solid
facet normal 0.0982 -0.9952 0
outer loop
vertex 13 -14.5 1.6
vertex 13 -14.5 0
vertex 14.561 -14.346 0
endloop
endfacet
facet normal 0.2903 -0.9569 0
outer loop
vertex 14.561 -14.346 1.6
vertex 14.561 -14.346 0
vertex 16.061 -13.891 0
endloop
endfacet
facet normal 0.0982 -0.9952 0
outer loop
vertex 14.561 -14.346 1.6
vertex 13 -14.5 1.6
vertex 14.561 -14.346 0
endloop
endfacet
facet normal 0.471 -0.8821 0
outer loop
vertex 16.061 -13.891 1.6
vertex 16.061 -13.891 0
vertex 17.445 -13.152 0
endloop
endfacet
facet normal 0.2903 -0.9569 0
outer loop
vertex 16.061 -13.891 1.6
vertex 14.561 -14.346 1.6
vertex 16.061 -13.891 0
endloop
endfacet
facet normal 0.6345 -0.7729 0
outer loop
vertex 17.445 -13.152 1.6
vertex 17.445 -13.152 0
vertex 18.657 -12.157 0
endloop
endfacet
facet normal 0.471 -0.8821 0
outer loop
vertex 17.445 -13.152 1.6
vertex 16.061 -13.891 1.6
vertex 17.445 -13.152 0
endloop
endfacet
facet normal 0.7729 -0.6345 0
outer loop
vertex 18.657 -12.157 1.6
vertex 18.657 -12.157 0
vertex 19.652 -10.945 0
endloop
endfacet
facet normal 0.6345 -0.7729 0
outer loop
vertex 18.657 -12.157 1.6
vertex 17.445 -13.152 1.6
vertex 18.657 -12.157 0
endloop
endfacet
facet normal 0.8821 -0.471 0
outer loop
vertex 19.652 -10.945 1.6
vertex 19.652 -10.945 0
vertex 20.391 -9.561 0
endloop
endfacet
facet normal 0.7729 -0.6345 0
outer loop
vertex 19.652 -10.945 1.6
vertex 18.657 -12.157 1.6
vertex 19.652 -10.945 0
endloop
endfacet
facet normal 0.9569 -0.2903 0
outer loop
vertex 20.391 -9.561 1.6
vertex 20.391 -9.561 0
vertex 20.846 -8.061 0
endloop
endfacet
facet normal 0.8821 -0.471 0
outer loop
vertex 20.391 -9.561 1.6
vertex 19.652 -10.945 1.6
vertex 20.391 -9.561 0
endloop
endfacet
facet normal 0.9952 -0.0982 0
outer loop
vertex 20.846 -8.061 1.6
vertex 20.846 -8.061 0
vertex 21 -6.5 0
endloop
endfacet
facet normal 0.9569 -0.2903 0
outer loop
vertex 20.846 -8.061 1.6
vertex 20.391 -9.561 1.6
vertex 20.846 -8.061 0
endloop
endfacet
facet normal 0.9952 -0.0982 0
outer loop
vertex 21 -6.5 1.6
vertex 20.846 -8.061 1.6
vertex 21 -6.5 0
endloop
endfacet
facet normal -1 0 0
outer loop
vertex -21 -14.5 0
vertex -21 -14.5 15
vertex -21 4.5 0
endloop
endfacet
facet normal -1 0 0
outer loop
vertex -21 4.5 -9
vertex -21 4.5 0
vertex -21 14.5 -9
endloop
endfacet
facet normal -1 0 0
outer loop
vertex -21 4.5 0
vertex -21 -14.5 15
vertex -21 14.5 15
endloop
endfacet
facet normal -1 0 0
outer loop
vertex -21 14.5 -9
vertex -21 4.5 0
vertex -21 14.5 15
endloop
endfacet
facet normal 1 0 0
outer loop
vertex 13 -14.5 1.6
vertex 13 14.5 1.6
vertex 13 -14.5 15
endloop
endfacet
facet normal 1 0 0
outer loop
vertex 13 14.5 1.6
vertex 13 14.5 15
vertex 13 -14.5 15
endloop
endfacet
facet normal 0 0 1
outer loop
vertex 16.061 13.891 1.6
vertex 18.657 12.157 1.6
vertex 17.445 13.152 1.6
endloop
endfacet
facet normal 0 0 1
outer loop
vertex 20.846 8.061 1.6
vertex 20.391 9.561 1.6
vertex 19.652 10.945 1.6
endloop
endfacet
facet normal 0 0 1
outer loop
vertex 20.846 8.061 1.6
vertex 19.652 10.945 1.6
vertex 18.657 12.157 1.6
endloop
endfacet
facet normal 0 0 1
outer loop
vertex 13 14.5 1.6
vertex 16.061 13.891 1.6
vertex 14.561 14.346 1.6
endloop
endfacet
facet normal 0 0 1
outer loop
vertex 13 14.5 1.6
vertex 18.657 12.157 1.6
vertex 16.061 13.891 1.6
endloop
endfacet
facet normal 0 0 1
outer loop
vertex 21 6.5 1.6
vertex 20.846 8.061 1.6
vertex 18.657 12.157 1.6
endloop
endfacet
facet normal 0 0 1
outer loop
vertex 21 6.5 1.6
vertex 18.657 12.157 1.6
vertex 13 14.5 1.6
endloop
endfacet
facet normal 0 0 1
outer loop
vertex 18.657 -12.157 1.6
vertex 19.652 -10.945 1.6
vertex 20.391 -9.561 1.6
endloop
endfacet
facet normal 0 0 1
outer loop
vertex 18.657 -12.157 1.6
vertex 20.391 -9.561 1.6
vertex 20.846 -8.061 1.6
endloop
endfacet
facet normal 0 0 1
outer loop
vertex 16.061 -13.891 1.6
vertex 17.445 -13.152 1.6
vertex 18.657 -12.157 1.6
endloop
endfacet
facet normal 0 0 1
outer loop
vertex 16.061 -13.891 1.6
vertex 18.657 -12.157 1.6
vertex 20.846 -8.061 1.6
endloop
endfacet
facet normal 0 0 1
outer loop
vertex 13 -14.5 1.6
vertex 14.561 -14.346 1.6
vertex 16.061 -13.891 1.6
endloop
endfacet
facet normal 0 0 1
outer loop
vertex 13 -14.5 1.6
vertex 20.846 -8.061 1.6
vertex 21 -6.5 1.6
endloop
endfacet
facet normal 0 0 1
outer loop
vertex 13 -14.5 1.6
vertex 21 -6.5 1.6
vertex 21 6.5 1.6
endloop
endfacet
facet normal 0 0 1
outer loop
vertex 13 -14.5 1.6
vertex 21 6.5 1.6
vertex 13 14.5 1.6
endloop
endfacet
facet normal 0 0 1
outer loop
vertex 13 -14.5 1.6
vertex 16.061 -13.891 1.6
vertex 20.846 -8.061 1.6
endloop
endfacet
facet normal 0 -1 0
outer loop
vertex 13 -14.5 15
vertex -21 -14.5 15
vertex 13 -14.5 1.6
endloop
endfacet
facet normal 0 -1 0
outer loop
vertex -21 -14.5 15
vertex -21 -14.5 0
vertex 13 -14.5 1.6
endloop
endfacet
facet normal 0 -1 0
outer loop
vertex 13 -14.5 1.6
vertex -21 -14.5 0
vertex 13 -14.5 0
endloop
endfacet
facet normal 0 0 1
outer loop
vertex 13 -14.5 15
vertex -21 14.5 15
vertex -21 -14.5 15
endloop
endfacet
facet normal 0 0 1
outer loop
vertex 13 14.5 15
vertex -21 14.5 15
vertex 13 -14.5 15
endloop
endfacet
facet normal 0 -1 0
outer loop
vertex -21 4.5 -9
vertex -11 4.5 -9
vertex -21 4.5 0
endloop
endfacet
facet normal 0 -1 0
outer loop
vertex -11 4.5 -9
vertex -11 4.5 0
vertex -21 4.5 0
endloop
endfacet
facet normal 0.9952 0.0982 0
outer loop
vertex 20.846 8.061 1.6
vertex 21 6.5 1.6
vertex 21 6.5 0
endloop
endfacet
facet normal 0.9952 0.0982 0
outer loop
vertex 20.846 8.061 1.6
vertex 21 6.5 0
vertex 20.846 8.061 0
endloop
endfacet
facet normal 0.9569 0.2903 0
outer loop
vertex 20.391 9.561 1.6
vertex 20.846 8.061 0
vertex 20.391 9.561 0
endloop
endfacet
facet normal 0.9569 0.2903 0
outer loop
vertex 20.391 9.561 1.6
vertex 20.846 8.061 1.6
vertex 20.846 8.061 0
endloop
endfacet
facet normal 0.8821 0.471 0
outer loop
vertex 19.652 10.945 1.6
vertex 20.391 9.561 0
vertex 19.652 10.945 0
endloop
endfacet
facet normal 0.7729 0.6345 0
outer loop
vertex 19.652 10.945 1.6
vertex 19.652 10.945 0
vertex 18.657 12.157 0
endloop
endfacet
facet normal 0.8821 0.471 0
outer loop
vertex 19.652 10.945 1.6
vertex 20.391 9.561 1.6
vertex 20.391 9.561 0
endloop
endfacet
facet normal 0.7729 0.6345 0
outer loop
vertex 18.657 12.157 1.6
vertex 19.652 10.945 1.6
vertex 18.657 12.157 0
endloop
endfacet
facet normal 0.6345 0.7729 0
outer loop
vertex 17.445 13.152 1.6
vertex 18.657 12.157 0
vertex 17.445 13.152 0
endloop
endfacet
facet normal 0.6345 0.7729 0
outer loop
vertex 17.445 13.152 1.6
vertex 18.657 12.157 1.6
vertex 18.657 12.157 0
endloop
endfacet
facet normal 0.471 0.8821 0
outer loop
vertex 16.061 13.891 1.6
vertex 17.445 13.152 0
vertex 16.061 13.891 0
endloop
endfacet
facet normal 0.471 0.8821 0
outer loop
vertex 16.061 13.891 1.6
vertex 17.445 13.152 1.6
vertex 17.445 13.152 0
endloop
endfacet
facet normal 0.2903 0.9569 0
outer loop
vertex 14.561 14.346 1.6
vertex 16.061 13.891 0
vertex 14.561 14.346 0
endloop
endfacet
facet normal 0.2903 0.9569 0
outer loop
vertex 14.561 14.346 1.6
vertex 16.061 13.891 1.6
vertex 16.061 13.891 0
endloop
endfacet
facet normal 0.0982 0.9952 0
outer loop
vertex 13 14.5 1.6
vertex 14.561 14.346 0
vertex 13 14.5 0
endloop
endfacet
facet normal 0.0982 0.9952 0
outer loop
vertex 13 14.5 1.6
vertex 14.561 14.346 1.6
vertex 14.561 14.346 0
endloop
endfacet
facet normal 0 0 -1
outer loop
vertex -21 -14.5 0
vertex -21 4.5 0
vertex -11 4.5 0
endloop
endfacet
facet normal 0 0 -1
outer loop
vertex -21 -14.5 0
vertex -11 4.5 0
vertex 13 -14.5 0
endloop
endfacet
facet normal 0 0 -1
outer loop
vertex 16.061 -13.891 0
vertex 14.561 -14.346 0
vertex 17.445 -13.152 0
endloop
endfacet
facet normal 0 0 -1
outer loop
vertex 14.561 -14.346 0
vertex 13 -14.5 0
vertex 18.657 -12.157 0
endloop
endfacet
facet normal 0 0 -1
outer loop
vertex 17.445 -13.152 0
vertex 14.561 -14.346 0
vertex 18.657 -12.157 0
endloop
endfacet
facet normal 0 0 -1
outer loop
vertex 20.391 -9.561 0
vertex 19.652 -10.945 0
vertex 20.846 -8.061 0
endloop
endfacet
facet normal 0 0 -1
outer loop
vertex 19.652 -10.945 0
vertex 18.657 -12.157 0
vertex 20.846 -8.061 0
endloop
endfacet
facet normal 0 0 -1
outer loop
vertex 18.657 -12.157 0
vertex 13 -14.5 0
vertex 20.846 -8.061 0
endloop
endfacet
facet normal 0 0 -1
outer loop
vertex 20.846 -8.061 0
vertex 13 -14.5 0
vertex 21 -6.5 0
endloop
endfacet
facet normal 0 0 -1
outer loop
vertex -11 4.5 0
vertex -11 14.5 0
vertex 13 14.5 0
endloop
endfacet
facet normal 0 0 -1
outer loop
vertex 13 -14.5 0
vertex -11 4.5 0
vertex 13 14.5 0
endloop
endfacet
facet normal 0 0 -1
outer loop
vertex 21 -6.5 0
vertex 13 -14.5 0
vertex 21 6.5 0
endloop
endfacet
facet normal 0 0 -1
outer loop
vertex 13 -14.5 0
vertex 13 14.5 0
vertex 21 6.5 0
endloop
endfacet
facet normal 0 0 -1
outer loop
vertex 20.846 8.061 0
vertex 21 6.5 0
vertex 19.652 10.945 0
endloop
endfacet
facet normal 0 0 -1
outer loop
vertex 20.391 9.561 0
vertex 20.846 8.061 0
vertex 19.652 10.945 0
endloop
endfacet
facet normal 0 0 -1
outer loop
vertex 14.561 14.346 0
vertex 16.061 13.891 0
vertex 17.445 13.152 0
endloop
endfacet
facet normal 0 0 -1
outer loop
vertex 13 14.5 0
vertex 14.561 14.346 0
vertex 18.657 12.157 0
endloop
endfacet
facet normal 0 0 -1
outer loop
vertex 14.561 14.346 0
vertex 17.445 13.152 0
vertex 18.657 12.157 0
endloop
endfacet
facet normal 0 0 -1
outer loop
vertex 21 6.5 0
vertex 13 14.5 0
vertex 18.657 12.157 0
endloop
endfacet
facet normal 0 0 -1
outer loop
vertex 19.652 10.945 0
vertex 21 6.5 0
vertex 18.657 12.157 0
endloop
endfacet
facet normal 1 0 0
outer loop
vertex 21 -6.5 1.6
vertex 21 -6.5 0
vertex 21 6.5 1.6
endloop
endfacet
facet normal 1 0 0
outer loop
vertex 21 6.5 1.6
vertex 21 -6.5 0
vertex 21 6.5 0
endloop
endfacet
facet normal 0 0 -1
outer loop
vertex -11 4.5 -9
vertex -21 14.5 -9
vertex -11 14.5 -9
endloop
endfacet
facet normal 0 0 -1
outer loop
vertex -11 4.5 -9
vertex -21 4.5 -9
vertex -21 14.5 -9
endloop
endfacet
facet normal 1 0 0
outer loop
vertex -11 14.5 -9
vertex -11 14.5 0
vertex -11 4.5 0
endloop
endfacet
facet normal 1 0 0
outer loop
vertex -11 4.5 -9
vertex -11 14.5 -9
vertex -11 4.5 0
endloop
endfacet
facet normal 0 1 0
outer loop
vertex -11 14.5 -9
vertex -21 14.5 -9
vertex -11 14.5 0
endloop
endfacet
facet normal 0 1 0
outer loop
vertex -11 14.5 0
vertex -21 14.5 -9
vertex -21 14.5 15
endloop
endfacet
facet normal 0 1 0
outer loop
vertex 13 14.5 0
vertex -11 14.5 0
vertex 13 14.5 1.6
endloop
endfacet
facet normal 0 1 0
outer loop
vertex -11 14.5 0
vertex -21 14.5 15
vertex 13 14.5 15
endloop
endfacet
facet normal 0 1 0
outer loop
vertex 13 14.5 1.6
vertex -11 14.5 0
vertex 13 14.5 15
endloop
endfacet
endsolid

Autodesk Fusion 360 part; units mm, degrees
sketch "Sketch1" plane through (0, 0, 0) normal (0, 0, 1) x (1, 0, 0)
  line L0 (21, 14.5) -> (-21, 14.5)
  line L1 (-21, 14.5) -> (-21, -14.5)
  line L2 (-21, -14.5) -> (21, -14.5)
  line L3 (21, -14.5) -> (21, 14.5)
  line L4 (21, 14.5) -> (-21, -14.5) construction
  line L5 (-21, 14.5) -> (21, -14.5) construction
  dimension "d1" = 42
  dimension "d2" = 29
extrude "Extrude1" add sketch "Sketch1" along normal blind 15
fillet "Fillet1" radius 8 2 edges at (21, -14.5, 7.5) (21, 14.5, 7.5)
sketch "Sketch2" plane through (0, 0, 0) normal (0, 0, -1) x (1, 0, 0)
  arc A0 (13, -14.5) -> (21, -6.5) centre (13, -6.5) ccw
  line L0 (21, -6.5) -> (21, 6.5)
  arc A1 (21, 6.5) -> (13, 14.5) centre (13, 6.5) ccw
  line L1 (13, 14.5) -> (-21, 14.5)
  line L2 (-21, 14.5) -> (-21, -14.5)
  line L3 (-21, -14.5) -> (13, -14.5)
  line L4 (-21, -14.5) -> (-11, -14.5)
  line L5 (-11, -14.5) -> (-11, -4.5)
  line L6 (-11, -4.5) -> (-21, -4.5)
  line L7 (-21, -4.5) -> (-21, -14.5)
  dimension "d6" = 10
  dimension "d7" = 10
extrude "Extrude2" add sketch "Sketch2" along normal blind 9 contours L2 L3 L4 L5 L6 L7
sketch "Sketch3" plane through (0, 0, 0) normal (0, 0, -1) x (1, 0, 0)
  line L0 (-11, -4.5) -> (-11, -14.5)
  line L1 (-11, -14.5) -> (13, -14.5)
  arc A0 (13, -14.5) -> (21, -6.5) centre (13, -6.5) ccw
  line L2 (21, -6.5) -> (21, 6.5)
  arc A1 (21, 6.5) -> (13, 14.5) centre (13, 6.5) ccw
  line L3 (13, 14.5) -> (-21, 14.5)
  line L4 (-21, 14.5) -> (-21, -4.5)
  line L5 (-21, -4.5) -> (-11, -4.5)
  line L6 (-14.2092, -3.0986) -> (16.0935, -3.0986) construction
  line L7 (16.0935, -3.0986) -> (16.0935, 6.9014) construction
  line L8 (16.0935, 6.9014) -> (-14.2092, 6.9014) construction
  line L9 (-14.2092, 6.9014) -> (-14.2092, -3.0986) construction
sketch "Sketch4" plane through (0, 0, 15) normal (0, 0, 1) x (-1, 0, 0)
  arc A0 (-21, -6.5) -> (-13, -14.5) centre (-13, -6.5) ccw
  line L0 (-13, -14.5) -> (21, -14.5)
  line L1 (21, -14.5) -> (21, 14.5)
  line L2 (21, 14.5) -> (-13, 14.5)
  arc A1 (-13, 14.5) -> (-21, 6.5) centre (-13, 6.5) ccw
  line L3 (-21, 6.5) -> (-21, -6.5)
  line L4 (-13, 14.5) -> (-29, 14.5)
  line L5 (-29, 14.5) -> (-29, -20)
  line L6 (-29, -20) -> (-13, -20)
  line L7 (-13, -20) -> (-13, 14.5)
extrude "Extrude3" cut sketch "Sketch4" against normal blind 13.4 contours A0 A1 L3 L7 | A0 A1 L3 L4 L5 L6 L7
equation "d10 = -15 mm + 1.6 mm"
